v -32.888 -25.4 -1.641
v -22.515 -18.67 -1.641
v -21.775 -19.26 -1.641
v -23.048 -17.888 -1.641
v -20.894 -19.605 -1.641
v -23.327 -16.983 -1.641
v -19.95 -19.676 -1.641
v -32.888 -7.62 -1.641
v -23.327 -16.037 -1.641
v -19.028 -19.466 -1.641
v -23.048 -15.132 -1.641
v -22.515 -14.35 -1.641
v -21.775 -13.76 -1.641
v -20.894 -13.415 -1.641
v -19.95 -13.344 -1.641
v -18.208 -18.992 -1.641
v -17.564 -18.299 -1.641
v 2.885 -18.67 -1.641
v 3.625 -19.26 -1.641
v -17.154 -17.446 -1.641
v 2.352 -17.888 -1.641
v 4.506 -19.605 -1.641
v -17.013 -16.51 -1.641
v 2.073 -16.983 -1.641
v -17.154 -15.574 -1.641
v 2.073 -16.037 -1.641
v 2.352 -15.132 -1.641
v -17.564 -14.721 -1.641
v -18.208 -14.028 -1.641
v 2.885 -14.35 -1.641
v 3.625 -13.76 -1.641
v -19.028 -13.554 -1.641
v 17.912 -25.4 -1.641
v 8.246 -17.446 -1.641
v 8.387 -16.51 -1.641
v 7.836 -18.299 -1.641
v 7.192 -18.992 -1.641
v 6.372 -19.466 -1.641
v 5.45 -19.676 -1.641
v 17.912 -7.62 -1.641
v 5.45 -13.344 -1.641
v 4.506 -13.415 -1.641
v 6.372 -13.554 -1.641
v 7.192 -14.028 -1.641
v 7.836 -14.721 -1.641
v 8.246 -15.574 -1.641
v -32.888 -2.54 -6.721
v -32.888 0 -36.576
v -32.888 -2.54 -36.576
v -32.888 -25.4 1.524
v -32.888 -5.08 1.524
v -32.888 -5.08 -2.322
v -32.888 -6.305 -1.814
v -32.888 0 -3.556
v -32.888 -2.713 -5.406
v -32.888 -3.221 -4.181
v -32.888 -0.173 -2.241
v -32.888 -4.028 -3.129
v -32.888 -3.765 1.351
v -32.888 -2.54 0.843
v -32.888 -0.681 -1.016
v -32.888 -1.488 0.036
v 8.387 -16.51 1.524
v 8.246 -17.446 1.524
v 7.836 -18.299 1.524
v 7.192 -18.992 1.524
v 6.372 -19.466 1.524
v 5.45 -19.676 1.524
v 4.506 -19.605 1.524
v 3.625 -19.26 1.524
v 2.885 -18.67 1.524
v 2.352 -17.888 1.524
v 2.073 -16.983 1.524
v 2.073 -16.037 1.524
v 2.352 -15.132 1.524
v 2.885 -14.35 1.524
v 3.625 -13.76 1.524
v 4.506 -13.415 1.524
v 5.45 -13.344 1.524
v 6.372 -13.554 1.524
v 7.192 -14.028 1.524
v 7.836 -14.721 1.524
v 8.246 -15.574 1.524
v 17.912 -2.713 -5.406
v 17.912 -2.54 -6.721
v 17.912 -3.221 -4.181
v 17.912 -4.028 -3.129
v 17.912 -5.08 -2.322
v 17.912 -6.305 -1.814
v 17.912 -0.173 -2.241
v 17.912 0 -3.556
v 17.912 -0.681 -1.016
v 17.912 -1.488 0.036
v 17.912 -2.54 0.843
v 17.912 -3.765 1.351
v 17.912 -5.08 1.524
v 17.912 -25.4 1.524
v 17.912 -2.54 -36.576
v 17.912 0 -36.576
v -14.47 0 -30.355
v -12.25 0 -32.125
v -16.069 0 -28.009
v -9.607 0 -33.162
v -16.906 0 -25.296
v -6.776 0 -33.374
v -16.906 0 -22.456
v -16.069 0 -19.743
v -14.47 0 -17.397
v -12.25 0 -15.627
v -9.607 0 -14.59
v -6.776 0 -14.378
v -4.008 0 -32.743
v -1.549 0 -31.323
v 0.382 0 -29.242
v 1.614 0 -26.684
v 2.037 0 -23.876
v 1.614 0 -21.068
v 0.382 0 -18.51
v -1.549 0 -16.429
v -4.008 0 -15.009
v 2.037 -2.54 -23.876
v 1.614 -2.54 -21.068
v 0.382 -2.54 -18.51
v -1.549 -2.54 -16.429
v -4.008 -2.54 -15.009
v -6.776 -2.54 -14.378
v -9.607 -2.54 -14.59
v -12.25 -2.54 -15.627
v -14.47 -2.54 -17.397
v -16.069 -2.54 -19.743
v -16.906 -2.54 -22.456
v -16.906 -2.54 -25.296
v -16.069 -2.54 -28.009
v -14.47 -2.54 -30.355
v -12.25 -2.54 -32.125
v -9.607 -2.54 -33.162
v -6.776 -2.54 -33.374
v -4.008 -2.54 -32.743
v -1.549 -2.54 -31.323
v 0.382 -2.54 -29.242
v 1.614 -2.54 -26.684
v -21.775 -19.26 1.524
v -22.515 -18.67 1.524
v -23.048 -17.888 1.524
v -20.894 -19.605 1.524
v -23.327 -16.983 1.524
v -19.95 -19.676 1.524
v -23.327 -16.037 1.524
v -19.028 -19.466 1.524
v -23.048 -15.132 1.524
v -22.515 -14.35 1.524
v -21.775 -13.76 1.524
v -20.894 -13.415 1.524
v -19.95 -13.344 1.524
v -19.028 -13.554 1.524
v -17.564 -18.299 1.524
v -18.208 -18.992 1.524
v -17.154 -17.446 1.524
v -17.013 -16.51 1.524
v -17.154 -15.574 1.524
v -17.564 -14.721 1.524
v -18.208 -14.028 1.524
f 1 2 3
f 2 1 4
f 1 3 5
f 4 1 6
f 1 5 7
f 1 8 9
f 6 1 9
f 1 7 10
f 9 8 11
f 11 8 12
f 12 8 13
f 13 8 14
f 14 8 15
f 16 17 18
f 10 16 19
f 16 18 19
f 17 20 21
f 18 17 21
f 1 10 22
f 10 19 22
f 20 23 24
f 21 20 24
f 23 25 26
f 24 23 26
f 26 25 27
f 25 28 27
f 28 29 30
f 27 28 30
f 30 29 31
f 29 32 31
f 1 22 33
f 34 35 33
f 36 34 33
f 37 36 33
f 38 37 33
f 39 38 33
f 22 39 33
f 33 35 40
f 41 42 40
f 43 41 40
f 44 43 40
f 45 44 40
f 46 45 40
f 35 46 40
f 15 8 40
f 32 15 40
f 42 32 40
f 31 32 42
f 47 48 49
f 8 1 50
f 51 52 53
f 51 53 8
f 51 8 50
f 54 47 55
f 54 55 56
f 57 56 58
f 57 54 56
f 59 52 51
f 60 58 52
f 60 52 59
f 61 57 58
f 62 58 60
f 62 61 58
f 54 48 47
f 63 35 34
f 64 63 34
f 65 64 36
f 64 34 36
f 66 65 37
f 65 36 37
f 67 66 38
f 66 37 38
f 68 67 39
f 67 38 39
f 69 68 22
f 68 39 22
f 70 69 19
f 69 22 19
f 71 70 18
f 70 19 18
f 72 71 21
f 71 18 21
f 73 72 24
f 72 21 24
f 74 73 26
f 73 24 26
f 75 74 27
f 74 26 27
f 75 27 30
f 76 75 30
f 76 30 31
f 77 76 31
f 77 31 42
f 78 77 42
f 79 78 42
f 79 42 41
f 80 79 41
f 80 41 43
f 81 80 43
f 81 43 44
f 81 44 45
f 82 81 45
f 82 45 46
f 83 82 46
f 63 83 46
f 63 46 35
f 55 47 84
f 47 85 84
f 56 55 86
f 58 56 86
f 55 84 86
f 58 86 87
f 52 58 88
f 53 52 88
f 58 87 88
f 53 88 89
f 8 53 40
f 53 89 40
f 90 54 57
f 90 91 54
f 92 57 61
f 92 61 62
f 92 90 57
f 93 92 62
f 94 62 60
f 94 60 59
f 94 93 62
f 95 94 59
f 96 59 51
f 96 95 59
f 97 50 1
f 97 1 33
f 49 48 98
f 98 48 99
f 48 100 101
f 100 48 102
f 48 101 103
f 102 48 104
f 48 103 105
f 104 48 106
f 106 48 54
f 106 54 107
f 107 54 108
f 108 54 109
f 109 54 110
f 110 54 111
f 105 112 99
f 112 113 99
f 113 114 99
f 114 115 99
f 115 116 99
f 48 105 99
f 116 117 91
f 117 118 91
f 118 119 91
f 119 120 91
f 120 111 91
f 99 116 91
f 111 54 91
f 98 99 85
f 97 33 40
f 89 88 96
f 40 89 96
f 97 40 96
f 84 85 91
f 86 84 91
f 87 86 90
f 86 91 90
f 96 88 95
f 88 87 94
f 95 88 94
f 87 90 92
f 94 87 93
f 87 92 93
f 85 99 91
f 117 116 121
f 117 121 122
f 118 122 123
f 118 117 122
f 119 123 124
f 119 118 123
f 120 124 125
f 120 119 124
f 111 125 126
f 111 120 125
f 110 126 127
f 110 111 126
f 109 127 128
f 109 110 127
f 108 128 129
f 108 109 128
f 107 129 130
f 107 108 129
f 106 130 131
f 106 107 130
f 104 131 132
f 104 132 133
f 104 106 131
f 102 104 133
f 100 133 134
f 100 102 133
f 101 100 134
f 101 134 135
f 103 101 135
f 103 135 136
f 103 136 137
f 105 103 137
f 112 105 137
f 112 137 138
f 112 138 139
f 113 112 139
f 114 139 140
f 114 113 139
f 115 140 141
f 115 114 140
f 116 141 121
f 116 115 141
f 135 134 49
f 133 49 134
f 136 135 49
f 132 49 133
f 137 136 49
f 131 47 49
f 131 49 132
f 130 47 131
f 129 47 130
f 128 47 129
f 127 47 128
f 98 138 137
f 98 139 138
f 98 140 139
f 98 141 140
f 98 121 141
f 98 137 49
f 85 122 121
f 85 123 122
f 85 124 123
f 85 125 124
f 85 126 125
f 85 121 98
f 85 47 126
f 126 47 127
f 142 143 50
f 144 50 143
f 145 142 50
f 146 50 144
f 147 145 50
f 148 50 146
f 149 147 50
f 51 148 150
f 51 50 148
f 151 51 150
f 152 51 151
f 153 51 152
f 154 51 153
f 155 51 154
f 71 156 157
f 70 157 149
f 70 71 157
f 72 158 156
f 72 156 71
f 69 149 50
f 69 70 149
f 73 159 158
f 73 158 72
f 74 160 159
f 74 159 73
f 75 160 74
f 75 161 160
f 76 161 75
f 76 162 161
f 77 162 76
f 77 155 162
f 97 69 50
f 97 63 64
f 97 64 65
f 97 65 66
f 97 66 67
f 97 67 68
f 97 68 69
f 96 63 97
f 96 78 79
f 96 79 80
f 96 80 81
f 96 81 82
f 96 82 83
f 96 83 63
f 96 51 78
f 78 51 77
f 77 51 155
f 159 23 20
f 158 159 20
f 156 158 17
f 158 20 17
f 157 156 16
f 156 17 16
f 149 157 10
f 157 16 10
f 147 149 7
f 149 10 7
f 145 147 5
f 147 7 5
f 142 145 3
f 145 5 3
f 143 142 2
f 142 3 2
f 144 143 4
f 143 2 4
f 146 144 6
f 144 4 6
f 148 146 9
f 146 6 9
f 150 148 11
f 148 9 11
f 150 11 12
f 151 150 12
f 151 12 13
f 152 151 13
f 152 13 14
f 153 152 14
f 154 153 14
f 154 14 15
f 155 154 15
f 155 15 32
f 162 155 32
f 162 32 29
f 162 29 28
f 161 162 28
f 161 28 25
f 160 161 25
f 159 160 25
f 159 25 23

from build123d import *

# Parameters (mm, degrees)
F0_W     = 50.8
F0_H     = 34.935082
F0_R     = 9.525
F1_DEPTH = 2.54
F0_H_2   = 3.164918
F2_DEPTH = 25.4
F3_R     = 5.08
F4_R     = 3.175
F5_DEPTH = 25.4


with BuildPart() as f1:
    # F0 (on Front) → F1 (new body)
    with BuildSketch(Plane.XZ):
        with Locations((-7.487633, -19.108459)):
            Rectangle(F0_W, F0_H)
        with Locations((-7.487633, -23.876)):
            Circle(F0_R, mode=Mode.SUBTRACT)
    extrude(amount=F1_DEPTH)

    # F0 (on Front) → F2 (join)
    with BuildSketch(Plane.XZ):
        with Locations((-7.487633, -0.058459)):
            Rectangle(F0_W, F0_H_2)
    extrude(amount=F2_DEPTH)

    # F3
    f3_edges = [f1.edges().sort_by_distance(p)[0] for p in [
        (-7.487633, -2.54, -1.640918),
        (-7.487633, 0, 1.524),
    ]]
    fillet(f3_edges, radius=F3_R)

    # F4 (on face) → F5 (cut)
    with BuildSketch(Plane(origin=(0, 0, -1.640918), x_dir=(1, 0, 0), z_dir=(0, 0, -1))):
        with Locations((-20.187633, 16.51)):
            Circle(F4_R)
        with Locations((5.212367, 16.51)):
            Circle(F4_R)
    extrude(amount=-F5_DEPTH, mode=Mode.SUBTRACT)


solid = f1.part
